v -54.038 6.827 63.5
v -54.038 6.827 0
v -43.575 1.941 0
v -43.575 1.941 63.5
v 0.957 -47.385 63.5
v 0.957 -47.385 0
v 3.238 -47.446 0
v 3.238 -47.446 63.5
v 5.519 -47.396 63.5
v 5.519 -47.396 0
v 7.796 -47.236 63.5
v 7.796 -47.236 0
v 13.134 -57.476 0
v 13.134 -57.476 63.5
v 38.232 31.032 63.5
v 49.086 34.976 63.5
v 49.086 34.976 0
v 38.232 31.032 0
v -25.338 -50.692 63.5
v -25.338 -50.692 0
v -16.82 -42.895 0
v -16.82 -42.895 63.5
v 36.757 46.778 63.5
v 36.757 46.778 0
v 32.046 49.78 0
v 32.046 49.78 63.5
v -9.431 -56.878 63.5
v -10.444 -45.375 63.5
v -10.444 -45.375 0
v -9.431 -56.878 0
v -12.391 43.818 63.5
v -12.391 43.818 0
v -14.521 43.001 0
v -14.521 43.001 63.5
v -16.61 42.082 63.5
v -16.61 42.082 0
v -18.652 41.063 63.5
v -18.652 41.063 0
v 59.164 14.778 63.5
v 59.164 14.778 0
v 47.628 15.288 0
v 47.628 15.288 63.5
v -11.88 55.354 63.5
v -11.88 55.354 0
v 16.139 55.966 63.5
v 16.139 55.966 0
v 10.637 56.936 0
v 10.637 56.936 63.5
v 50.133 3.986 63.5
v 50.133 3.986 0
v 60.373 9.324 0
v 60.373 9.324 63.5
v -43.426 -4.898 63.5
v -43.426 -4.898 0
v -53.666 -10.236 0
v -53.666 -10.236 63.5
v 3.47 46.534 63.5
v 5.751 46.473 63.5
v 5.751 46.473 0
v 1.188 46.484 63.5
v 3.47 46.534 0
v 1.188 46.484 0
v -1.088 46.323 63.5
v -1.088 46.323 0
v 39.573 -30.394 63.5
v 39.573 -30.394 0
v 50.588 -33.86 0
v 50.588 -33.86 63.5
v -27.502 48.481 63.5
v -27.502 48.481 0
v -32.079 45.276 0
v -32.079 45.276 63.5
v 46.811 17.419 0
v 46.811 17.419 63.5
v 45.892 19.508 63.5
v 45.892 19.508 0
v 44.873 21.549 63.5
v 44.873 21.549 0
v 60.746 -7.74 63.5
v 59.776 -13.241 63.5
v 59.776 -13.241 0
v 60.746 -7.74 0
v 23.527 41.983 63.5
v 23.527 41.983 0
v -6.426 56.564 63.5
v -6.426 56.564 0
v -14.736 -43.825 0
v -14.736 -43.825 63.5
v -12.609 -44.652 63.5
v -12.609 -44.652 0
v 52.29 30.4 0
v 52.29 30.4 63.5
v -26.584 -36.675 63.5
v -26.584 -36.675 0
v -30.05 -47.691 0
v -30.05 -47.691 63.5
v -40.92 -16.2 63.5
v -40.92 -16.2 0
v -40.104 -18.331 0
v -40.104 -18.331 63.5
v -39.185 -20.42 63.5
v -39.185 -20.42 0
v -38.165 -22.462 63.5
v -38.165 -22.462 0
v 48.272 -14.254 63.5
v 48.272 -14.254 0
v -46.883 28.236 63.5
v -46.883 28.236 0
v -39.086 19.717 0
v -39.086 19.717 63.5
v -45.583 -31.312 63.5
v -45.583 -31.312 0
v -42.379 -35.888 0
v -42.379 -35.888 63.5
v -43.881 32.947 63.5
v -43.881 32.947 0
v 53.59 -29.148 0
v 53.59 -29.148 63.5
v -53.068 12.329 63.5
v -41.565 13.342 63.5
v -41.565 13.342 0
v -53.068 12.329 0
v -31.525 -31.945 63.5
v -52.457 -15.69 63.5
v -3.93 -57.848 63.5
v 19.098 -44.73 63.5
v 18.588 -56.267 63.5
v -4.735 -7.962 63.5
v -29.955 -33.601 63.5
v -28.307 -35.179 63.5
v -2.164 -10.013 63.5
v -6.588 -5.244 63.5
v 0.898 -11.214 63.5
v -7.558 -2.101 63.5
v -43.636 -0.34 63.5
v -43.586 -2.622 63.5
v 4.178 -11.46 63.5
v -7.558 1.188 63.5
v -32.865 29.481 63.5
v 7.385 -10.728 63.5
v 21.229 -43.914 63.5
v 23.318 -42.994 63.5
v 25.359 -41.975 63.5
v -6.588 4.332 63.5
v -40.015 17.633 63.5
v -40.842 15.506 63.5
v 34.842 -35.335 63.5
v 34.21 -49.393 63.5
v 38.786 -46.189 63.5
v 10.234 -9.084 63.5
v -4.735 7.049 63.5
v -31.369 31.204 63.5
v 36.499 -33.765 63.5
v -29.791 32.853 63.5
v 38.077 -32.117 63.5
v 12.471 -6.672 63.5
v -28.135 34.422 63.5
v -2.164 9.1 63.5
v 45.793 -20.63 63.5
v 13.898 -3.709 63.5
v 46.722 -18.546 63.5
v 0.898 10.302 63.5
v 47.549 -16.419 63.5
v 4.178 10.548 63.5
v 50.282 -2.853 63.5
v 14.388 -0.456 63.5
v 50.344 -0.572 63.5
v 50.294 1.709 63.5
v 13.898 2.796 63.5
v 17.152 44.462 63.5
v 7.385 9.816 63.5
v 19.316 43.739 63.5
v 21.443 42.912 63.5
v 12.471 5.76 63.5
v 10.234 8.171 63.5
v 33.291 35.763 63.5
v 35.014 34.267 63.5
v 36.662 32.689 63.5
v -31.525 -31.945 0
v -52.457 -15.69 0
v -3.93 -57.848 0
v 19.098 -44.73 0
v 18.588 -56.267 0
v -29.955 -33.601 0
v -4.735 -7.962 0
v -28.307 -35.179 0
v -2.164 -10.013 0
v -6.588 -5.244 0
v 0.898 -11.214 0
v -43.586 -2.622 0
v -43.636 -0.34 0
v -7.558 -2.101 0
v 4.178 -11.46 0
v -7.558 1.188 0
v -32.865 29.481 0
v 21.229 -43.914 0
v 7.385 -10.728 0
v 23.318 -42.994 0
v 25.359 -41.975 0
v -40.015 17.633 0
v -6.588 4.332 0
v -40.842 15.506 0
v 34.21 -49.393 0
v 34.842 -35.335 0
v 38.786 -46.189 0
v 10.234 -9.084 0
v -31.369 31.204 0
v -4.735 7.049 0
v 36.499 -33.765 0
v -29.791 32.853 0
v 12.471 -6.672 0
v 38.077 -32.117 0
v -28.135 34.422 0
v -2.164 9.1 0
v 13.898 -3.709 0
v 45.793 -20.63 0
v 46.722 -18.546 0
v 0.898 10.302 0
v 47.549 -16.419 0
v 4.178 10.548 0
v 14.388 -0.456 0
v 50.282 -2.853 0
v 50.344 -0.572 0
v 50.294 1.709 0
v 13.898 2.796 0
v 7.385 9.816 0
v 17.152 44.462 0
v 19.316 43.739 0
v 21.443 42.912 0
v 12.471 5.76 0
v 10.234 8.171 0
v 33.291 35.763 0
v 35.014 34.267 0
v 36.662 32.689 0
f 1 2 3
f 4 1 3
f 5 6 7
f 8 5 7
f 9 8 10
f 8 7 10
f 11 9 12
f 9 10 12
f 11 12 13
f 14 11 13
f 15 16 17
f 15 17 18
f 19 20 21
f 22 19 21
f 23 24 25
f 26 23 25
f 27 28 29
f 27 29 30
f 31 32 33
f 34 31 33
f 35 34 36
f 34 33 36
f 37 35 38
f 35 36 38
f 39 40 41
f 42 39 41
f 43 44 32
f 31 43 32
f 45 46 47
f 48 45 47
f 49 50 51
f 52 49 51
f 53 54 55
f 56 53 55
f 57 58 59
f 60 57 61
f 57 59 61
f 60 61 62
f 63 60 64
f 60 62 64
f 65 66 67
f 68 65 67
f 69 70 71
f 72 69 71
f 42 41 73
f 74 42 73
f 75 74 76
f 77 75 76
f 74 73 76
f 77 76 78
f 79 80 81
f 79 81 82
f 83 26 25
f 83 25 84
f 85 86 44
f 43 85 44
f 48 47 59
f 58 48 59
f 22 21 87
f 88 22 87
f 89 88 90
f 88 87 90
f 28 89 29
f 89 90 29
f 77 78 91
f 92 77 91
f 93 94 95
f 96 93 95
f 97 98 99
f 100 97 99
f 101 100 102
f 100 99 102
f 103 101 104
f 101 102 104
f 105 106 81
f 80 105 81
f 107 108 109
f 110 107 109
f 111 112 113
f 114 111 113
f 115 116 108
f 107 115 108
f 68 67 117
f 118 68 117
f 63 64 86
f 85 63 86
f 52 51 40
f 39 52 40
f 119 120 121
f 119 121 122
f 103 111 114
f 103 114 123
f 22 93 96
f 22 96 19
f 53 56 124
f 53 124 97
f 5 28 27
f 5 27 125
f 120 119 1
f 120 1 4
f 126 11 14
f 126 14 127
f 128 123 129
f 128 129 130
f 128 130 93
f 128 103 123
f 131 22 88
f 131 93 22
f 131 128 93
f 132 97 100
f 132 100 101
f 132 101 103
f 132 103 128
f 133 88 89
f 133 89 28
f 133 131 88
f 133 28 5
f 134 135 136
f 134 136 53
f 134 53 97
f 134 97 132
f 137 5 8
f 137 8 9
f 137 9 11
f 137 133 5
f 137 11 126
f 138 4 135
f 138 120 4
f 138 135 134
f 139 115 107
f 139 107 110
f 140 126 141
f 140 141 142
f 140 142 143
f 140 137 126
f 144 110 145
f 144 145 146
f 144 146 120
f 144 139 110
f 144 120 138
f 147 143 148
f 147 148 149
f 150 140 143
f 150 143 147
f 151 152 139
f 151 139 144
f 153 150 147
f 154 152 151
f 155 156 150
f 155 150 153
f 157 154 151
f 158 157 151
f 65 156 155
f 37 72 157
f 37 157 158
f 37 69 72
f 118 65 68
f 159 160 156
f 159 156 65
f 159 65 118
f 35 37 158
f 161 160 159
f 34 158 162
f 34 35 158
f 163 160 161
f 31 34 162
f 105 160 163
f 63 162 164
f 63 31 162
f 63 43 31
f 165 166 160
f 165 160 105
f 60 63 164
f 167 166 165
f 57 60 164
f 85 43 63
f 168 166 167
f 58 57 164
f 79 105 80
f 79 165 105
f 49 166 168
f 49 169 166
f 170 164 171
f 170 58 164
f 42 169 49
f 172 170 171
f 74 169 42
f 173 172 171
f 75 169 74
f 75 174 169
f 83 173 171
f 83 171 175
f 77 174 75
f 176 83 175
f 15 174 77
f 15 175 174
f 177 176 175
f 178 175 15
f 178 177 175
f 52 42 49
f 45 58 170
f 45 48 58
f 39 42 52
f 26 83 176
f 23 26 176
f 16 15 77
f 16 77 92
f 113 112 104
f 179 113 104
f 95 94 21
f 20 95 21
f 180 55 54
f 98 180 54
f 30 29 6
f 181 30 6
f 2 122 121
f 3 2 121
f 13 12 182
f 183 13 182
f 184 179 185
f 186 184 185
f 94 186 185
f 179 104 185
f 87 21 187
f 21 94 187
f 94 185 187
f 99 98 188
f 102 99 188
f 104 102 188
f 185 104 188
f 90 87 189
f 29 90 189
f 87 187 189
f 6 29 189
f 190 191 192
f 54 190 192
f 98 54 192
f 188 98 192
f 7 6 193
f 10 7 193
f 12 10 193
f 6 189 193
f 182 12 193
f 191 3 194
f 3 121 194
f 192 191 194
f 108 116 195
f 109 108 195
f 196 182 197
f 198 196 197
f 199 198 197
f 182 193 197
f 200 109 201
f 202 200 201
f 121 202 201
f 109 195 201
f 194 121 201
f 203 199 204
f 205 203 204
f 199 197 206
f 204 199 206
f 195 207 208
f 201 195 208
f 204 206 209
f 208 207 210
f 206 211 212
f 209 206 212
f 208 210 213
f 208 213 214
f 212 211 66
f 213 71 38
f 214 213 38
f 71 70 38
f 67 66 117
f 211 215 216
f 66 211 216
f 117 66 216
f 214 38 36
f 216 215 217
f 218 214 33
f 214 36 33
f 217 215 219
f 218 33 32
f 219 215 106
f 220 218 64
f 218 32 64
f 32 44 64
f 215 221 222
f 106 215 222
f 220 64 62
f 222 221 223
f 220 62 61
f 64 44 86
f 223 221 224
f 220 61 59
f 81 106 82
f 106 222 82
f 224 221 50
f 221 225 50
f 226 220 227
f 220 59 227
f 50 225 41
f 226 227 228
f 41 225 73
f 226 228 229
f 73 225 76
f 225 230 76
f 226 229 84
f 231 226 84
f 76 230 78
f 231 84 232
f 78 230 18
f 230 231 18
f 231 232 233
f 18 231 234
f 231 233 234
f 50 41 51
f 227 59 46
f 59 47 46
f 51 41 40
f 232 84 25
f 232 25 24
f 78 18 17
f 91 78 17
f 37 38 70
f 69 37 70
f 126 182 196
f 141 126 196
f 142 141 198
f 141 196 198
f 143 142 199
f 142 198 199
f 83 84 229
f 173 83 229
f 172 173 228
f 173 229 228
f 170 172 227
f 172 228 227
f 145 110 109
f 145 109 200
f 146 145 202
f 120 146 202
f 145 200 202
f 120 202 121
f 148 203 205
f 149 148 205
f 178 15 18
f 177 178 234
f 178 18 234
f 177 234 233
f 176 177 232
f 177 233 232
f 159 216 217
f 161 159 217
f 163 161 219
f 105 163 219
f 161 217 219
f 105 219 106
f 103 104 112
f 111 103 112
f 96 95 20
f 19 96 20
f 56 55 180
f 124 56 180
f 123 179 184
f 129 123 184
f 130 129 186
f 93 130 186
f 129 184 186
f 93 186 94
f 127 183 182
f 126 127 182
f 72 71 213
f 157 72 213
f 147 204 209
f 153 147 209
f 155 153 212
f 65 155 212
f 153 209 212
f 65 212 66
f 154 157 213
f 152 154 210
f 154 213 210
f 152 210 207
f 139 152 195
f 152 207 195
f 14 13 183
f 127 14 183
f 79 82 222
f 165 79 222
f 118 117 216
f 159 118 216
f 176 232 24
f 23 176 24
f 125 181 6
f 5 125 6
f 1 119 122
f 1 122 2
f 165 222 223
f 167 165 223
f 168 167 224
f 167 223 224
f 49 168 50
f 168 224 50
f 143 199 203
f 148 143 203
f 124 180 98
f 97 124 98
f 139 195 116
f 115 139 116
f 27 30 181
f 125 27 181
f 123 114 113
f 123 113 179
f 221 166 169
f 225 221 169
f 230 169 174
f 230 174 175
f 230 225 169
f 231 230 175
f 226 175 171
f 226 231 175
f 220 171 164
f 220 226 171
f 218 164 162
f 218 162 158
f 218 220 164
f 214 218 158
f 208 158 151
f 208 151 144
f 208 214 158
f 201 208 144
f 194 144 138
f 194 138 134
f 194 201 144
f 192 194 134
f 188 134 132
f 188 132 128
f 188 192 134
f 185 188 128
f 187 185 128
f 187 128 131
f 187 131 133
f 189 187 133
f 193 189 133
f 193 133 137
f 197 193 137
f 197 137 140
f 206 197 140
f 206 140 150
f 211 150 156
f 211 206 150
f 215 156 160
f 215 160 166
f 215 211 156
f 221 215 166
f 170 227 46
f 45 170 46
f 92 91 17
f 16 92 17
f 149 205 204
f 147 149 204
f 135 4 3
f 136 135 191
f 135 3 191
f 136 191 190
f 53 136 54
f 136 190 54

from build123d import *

# Parameters (mm, degrees)
F0_R     = 11.034718
F1_DEPTH = 63.5


with BuildPart() as f1:
    # F0 (on Top) → F1 (new body)
    with BuildSketch(Plane.XY):
        with BuildLine():
            Line((-32.078517, 45.276365), (-28.134993, 34.4225))
            ThreePointArc((-28.134993, 34.4225), (-30.590232, 32.037975), (-32.865392, 29.481061))
            Line((-32.865392, 29.481061), (-43.88094, 32.947393))
            Line((-43.88094, 32.947393), (-46.882508, 28.235875))
            Line((-46.882508, 28.235875), (-39.085573, 19.717333))
            ThreePointArc((-39.085573, 19.717333), (-40.441399, 16.57474), (-41.564885, 13.341794))
            Line((-41.564885, 13.341794), (-53.068432, 12.328799))
            Line((-53.068432, 12.328799), (-54.038499, 6.827273))
            Line((-54.038499, 6.827273), (-43.575165, 1.940925))
            ThreePointArc((-43.575165, 1.940925), (-43.625167, -1.481305), (-43.425937, -4.898097))
            Line((-43.425937, -4.898097), (-53.666173, -10.236199))
            Line((-53.666173, -10.236199), (-52.457055, -15.690175))
            Line((-52.457055, -15.690175), (-40.920271, -16.200428))
            ThreePointArc((-40.920271, -16.200428), (-39.656836, -19.381291), (-38.165222, -22.461753))
            Line((-38.165222, -22.461753), (-45.583163, -31.312284))
            Line((-45.583163, -31.312284), (-42.378938, -35.888392))
            Line((-42.378938, -35.888392), (-31.525073, -31.944868))
            ThreePointArc((-31.525073, -31.944868), (-29.140548, -34.400106), (-26.583635, -36.675266))
            Line((-26.583635, -36.675266), (-30.049966, -47.690814))
            Line((-30.049966, -47.690814), (-25.338448, -50.692383))
            Line((-25.338448, -50.692383), (-16.819906, -42.895447))
            ThreePointArc((-16.819906, -42.895447), (-13.677313, -44.251274), (-10.444367, -45.374759))
            Line((-10.444367, -45.374759), (-9.431372, -56.878306))
            Line((-9.431372, -56.878306), (-3.929846, -57.848374))
            Line((-3.929846, -57.848374), (0.956502, -47.38504))
            ThreePointArc((0.956502, -47.38504), (4.378732, -47.435041), (7.795524, -47.235812))
            Line((7.795524, -47.235812), (13.133626, -57.476047))
            Line((13.133626, -57.476047), (18.587602, -56.26693))
            Line((18.587602, -56.26693), (19.097855, -44.730146))
            ThreePointArc((19.097855, -44.730146), (22.278718, -43.46671), (25.35918, -41.975097))
            Line((25.35918, -41.975097), (34.209711, -49.393037))
            Line((34.209711, -49.393037), (38.785819, -46.188812))
            Line((38.785819, -46.188812), (34.842295, -35.334948))
            ThreePointArc((34.842295, -35.334948), (37.297533, -32.950422), (39.572693, -30.393509))
            Line((39.572693, -30.393509), (50.588241, -33.859841))
            Line((50.588241, -33.859841), (53.589809, -29.148323))
            Line((53.589809, -29.148323), (45.792874, -20.629781))
            ThreePointArc((45.792874, -20.629781), (47.1487, -17.487187), (48.272186, -14.254241))
            Line((48.272186, -14.254241), (59.775733, -13.241247))
            Line((59.775733, -13.241247), (60.7458, -7.739721))
            Line((60.7458, -7.739721), (50.282467, -2.853372))
            ThreePointArc((50.282467, -2.853372), (50.332468, 0.568858), (50.133239, 3.985649))
            Line((50.133239, 3.985649), (60.373474, 9.323751))
            Line((60.373474, 9.323751), (59.164357, 14.777727))
            Line((59.164357, 14.777727), (47.627572, 15.28798))
            ThreePointArc((47.627572, 15.28798), (46.364137, 18.468843), (44.872523, 21.549305))
            Line((44.872523, 21.549305), (52.290464, 30.399837))
            Line((52.290464, 30.399837), (49.086239, 34.975944))
            Line((49.086239, 34.975944), (38.232375, 31.03242))
            ThreePointArc((38.232375, 31.03242), (35.847849, 33.487659), (33.290936, 35.762819))
            Line((33.290936, 35.762819), (36.757268, 46.778367))
            Line((36.757268, 46.778367), (32.045749, 49.779935))
            Line((32.045749, 49.779935), (23.527208, 41.983))
            ThreePointArc((23.527208, 41.983), (20.384614, 43.338826), (17.151668, 44.462311))
            Line((17.151668, 44.462311), (16.138674, 55.965858))
            Line((16.138674, 55.965858), (10.637148, 56.935926))
            Line((10.637148, 56.935926), (5.750799, 46.472592))
            ThreePointArc((5.750799, 46.472592), (2.328569, 46.522594), (-1.088223, 46.323364))
            Line((-1.088223, 46.323364), (-6.426325, 56.5636))
            Line((-6.426325, 56.5636), (-11.8803, 55.354482))
            Line((-11.8803, 55.354482), (-12.390553, 43.817698))
            ThreePointArc((-12.390553, 43.817698), (-15.571416, 42.554263), (-18.651878, 41.062649))
            Line((-18.651878, 41.062649), (-27.50241, 48.48059))
            Line((-27.50241, 48.48059), (-32.078517, 45.276365))
        make_face()
        with Locations((3.353651, -0.456224)):
            Circle(F0_R, mode=Mode.SUBTRACT)
    extrude(amount=F1_DEPTH)


solid = f1.part
